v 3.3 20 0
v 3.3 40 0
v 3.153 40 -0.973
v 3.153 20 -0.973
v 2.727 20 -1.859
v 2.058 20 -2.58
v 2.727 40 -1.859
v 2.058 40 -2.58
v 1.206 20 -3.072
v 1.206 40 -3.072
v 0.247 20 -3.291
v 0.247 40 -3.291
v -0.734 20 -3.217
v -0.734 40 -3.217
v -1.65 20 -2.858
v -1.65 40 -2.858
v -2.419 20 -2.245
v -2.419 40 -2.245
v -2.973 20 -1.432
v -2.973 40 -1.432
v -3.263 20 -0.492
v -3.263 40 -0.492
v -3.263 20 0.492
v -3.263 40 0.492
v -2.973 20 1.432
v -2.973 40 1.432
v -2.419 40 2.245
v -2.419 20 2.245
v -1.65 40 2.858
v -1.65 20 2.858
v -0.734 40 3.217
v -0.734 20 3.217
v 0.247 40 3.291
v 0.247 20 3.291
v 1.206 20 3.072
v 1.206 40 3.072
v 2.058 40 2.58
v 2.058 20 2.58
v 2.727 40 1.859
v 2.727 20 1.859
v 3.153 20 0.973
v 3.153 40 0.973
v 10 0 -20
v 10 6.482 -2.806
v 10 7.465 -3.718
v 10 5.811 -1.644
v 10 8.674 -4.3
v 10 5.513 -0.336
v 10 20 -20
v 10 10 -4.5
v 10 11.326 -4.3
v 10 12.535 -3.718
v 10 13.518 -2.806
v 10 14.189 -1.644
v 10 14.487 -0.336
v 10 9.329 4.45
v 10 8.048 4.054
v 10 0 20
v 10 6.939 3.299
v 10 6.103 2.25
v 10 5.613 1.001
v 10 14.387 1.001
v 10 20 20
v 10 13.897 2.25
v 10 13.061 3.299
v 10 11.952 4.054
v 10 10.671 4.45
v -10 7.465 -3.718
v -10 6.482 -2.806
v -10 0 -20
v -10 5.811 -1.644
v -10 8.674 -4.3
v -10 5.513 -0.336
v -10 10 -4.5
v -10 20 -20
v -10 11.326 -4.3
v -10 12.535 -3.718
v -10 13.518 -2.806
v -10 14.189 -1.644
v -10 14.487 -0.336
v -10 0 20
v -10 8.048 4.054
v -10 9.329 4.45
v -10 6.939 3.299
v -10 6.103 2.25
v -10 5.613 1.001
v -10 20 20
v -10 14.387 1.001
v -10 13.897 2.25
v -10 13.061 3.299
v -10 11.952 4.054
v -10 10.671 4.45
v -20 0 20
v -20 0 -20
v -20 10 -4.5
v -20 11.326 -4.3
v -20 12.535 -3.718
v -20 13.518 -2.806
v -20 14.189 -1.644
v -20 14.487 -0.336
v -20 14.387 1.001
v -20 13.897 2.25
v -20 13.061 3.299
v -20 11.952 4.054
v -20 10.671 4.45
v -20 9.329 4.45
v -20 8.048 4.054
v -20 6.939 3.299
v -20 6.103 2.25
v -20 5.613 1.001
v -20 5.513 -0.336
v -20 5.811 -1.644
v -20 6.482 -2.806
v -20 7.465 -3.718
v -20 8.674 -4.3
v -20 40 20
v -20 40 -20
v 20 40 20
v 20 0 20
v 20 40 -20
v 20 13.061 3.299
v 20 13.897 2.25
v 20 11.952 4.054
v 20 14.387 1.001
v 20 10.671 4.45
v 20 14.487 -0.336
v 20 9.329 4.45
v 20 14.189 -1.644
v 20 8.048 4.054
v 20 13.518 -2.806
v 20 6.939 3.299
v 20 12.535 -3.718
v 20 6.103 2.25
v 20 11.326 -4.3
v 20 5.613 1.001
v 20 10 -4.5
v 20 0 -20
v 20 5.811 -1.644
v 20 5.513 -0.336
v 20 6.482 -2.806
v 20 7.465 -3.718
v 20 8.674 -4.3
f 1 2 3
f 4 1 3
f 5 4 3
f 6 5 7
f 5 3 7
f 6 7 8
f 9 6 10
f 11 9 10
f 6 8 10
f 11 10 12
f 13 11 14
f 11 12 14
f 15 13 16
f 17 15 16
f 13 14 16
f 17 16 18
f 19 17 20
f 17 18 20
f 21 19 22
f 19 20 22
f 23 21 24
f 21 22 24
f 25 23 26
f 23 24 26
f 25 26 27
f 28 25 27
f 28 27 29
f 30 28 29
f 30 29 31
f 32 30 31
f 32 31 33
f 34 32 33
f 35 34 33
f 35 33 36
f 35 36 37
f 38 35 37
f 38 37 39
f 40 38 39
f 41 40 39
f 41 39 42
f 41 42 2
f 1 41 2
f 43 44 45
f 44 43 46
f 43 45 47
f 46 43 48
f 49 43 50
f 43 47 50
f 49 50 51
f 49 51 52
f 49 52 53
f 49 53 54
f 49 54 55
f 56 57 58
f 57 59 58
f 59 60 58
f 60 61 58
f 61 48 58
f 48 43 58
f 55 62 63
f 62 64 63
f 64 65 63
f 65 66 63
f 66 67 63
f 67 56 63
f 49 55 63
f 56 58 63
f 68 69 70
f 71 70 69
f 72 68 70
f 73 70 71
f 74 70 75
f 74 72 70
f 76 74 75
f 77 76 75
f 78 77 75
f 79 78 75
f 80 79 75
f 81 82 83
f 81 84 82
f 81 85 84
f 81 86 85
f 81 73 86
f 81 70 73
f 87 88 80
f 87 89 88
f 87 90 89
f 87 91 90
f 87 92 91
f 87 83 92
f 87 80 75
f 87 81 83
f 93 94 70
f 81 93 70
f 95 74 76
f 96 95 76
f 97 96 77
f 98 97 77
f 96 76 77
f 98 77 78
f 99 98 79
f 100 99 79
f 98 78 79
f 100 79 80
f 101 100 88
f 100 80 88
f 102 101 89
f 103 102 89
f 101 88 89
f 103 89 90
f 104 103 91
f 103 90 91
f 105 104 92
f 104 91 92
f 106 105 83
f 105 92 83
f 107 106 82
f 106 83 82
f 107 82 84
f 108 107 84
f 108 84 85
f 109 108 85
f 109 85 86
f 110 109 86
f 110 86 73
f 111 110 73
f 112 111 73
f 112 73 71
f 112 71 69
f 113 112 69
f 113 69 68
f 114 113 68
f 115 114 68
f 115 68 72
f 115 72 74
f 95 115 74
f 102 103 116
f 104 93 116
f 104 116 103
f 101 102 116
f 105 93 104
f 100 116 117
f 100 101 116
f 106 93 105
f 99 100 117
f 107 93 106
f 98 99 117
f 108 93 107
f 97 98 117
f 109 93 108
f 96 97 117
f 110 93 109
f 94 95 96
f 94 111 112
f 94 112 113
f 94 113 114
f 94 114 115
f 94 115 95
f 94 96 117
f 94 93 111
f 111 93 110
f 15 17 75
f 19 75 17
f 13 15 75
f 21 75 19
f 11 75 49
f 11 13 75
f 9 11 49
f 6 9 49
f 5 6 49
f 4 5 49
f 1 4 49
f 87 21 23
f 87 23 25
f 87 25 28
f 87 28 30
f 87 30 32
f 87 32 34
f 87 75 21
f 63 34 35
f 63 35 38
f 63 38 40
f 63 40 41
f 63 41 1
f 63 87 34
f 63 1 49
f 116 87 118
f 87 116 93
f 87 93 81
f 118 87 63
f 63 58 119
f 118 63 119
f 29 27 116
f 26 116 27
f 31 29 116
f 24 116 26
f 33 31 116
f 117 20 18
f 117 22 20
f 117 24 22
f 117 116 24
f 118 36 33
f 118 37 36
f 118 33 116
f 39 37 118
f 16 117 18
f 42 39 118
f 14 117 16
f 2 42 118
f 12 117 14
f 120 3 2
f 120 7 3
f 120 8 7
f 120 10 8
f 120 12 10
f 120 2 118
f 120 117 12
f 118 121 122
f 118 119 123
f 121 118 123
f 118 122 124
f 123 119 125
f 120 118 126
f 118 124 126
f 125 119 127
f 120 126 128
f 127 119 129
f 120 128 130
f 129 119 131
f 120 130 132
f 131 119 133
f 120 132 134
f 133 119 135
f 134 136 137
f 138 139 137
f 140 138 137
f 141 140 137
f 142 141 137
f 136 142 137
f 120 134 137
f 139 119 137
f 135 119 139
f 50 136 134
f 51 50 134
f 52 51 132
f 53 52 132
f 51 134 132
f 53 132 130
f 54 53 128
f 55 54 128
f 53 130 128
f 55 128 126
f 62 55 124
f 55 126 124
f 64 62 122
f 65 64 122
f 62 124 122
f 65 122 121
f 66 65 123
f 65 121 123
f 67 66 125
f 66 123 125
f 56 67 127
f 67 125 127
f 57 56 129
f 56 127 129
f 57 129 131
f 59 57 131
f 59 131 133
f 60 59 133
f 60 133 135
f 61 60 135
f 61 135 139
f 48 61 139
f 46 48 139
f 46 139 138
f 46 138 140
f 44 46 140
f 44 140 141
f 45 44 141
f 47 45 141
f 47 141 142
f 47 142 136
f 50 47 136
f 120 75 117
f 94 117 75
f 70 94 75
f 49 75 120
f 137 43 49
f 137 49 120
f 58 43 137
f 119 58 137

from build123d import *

# Parameters (mm, degrees)
SKETCH1_W           = 40
SKETCH1_H           = 40
BOSS_EXTRUDE1_DEPTH = 40
SKETCH2_R           = 3.3
CUT_EXTRUDE1_DEPTH  = 40
SKETCH3_W           = 20
SKETCH3_H           = 40
CUT_EXTRUDE2_DEPTH  = 40
SKETCH4_R           = 4.5
CUT_EXTRUDE3_DEPTH  = 40


with BuildPart() as part:
    # Sketch1 → Boss-Extrude1 (new body)
    with BuildSketch(Plane(origin=(0, 0, 0), x_dir=(1, 0, 0), z_dir=(0, 1, 0))):
        Rectangle(SKETCH1_W, SKETCH1_H)
    extrude(amount=BOSS_EXTRUDE1_DEPTH)

    # Sketch2 → Cut-Extrude1 (cut)
    with BuildSketch(Plane(origin=(0, 40, 0), x_dir=(1, 0, 0), z_dir=(0, 1, 0))):
        Circle(SKETCH2_R)
    extrude(amount=-CUT_EXTRUDE1_DEPTH, mode=Mode.SUBTRACT)

    # Sketch3 → Cut-Extrude2 (cut)
    with BuildSketch(Plane.XY.offset(20)):
        Rectangle(SKETCH3_W, SKETCH3_H)
    extrude(amount=-CUT_EXTRUDE2_DEPTH, mode=Mode.SUBTRACT)

    # Sketch4 → Cut-Extrude3 (cut)
    with BuildSketch(Plane(origin=(20, 0, 0), x_dir=(0, 0, -1), z_dir=(1, 0, 0))):
        with Locations((0, 10)):
            Circle(SKETCH4_R)
    extrude(amount=-CUT_EXTRUDE3_DEPTH, mode=Mode.SUBTRACT)


solid = part.part
